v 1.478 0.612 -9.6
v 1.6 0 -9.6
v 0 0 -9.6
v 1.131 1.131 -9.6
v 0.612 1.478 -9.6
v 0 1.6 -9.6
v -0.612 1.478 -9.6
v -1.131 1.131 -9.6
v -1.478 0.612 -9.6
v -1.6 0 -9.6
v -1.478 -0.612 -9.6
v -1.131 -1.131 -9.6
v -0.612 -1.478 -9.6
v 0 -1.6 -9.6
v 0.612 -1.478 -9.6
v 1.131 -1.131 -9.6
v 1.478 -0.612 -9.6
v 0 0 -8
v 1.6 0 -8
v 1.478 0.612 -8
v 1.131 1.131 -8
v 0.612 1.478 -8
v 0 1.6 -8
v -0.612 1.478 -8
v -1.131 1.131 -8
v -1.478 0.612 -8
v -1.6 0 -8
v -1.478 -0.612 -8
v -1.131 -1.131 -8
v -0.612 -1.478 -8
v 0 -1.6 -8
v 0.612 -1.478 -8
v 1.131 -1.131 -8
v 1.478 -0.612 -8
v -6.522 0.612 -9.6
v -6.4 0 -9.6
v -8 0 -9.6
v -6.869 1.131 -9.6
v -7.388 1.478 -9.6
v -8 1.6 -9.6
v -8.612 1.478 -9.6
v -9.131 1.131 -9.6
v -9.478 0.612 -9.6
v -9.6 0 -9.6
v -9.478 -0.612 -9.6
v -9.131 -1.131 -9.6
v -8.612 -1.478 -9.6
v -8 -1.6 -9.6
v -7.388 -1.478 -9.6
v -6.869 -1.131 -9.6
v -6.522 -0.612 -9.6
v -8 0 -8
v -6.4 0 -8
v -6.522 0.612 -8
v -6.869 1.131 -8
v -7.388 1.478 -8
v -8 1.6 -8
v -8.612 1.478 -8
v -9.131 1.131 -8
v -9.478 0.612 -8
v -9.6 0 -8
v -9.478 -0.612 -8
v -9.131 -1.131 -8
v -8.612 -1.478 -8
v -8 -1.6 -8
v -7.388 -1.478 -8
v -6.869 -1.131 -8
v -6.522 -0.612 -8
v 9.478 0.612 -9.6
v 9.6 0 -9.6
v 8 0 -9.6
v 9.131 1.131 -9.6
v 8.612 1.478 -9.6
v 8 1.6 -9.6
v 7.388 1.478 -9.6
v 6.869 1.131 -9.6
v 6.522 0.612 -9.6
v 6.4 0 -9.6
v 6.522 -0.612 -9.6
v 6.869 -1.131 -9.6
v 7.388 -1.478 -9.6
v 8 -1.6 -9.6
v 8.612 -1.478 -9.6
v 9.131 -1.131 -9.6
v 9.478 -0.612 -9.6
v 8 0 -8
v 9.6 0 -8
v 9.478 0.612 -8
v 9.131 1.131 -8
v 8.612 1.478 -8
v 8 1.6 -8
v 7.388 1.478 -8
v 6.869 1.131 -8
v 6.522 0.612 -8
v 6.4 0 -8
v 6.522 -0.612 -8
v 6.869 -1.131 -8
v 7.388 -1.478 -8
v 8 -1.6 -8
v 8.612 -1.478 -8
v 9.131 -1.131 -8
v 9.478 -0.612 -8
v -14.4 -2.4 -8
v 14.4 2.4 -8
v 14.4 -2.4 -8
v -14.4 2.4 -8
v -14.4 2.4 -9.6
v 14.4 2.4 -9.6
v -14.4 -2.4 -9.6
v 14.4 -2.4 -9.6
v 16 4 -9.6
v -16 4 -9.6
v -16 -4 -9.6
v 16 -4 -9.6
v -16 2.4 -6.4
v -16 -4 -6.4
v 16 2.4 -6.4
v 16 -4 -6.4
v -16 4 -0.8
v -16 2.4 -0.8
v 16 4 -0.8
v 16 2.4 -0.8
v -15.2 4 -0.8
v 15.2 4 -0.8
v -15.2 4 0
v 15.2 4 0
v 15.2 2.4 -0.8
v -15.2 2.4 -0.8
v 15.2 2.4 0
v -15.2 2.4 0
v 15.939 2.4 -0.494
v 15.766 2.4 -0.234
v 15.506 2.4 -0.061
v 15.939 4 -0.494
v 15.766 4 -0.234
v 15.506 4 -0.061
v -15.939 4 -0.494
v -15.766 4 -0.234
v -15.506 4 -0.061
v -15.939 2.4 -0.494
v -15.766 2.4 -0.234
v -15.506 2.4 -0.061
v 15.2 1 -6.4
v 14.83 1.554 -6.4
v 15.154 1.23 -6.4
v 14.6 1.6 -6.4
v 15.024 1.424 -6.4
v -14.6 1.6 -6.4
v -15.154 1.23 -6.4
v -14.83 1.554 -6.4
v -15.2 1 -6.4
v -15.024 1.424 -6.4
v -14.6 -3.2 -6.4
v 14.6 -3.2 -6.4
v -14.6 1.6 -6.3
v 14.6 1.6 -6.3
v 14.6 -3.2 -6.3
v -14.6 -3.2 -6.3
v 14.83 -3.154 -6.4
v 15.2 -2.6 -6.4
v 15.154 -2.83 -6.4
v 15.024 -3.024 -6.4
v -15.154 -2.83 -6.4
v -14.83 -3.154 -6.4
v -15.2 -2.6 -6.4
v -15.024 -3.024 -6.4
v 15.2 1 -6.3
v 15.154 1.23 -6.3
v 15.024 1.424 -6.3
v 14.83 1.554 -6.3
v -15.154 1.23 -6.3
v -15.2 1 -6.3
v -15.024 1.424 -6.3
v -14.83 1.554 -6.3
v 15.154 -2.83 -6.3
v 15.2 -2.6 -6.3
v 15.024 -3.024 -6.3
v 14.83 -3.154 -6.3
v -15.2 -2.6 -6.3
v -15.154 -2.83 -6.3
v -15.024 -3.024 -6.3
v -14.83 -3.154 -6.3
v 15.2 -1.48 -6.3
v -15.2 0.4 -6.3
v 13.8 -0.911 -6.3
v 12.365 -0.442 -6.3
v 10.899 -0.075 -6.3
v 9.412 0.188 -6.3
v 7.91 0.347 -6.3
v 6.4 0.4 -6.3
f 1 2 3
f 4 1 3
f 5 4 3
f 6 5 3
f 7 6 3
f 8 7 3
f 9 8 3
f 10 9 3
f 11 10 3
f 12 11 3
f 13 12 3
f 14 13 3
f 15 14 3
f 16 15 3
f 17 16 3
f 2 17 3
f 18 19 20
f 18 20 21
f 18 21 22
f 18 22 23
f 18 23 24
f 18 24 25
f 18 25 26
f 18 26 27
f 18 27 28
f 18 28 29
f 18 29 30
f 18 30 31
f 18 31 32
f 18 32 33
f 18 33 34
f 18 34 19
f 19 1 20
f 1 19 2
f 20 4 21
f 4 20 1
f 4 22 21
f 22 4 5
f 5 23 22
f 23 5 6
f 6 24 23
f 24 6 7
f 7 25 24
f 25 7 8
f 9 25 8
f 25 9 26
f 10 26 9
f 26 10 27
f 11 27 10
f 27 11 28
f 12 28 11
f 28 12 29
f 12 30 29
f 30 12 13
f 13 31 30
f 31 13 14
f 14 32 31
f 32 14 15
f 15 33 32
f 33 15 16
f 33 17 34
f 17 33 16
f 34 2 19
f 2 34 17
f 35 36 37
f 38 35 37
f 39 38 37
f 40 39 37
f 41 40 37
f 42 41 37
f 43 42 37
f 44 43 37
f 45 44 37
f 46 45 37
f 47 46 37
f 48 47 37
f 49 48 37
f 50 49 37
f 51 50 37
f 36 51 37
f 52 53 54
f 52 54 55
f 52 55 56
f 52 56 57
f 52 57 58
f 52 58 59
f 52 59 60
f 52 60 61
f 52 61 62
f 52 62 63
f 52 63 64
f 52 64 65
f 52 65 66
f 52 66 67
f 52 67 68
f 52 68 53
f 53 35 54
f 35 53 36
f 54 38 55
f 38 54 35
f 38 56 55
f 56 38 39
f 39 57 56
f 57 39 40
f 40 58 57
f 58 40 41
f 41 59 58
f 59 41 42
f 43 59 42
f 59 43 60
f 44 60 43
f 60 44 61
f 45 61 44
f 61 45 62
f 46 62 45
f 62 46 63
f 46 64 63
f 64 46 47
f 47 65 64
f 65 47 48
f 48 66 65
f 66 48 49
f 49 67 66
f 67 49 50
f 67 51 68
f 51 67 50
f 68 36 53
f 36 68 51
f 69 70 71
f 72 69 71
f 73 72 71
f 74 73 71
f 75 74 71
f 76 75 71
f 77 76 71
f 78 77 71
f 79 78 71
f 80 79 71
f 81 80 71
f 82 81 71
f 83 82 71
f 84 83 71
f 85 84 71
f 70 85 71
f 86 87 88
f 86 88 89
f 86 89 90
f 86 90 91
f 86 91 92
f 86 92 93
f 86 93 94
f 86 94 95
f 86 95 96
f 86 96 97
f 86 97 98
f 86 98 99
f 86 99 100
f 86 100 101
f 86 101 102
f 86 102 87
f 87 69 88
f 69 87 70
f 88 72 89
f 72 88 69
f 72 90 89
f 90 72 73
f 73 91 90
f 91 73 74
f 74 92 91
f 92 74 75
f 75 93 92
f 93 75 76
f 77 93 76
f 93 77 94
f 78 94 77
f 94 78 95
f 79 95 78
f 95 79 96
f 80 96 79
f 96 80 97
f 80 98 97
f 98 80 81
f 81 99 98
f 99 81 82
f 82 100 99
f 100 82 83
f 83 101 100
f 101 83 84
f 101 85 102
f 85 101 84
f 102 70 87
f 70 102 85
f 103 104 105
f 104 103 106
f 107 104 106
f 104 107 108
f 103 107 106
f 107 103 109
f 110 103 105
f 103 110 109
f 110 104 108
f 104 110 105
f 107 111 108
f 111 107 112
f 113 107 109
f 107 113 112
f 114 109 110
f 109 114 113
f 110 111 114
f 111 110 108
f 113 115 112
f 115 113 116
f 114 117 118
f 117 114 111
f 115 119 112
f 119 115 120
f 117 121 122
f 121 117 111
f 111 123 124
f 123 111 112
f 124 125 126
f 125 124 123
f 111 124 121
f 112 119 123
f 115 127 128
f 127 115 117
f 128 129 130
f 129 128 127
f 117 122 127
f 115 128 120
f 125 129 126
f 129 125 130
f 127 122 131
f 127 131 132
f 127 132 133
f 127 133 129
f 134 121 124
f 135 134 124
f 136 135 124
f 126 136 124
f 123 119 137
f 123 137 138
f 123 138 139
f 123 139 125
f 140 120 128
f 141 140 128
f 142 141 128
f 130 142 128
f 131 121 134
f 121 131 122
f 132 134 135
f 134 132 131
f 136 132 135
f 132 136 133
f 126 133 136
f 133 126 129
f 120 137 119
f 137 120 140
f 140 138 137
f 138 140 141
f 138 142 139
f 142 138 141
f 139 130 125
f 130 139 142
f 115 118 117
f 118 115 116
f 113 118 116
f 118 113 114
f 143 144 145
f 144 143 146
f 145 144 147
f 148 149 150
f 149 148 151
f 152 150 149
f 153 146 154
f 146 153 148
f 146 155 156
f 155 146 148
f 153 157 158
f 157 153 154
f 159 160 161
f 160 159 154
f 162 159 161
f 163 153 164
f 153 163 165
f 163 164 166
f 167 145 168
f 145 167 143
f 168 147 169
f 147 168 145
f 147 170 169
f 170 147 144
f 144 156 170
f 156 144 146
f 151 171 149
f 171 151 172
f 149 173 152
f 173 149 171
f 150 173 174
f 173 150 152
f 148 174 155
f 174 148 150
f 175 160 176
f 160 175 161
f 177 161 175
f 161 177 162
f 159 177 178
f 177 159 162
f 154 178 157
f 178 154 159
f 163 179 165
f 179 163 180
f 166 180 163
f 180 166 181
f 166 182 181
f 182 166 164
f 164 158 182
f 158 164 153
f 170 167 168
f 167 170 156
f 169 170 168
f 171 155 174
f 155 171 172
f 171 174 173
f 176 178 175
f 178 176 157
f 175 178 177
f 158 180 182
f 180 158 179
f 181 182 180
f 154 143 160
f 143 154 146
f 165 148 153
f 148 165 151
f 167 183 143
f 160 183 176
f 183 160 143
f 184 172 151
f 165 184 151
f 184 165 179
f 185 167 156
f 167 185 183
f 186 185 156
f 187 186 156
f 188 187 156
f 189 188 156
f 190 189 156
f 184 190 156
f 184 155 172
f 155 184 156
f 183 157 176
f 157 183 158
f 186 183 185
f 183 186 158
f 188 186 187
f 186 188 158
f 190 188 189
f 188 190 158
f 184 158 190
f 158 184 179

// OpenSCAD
// file: ../p/box3u12.scad
use <../lib.scad>
function ldraw_lib__box3u12() = [
// 0 Box with 3 Parallel Faces without Any Edges
// 0 Name: box3u12.dat
// 0 Author: J.C. Tchang [tchang]
// 0 !LDRAW_ORG Primitive UPDATE 2014-02
// 0 !LICENSE Licensed under CC BY 2.0 and CC BY 4.0 : see CAreadme.txt
// 
// 0 BFC CERTIFY CCW
  [0,"BFC","CERTIFY"],
  [0,"BFC","CCW"],
// 
// 0 !HISTORY 2014-12-23 [PTadmin] Official Update 2014-02
// 
// 
// 4 16 -1 1 1 1 1 1 1 1 -1 -1 1 -1
  [4,16,-1,1,1,1,1,1,1,1,-1,-1,1,-1],
// 4 16 -1 1 1 -1 0 1 1 0 1 1 1 1
  [4,16,-1,1,1,-1,0,1,1,0,1,1,1,1],
// 4 16 1 1 -1 1 0 -1 -1 0 -1 -1 1 -1
  [4,16,1,1,-1,1,0,-1,-1,0,-1,-1,1,-1],
];
makepoly(ldraw_lib__box3u12(), line=0.2);
// file: ../p/1-4chrd.scad
use <../lib.scad>
$fa=1; $fs=0.2;
function ldraw_lib__1_4chrd(realsolid=false) = [
// 0 Chord 0.25
// 0 Name: 1-4chrd.dat
// 0 Author: Tony Hafner [hafhead]
// 0 !LDRAW_ORG Primitive UPDATE 2012-02
// 0 !LICENSE Licensed under CC BY 2.0 and CC BY 4.0 : see CAreadme.txt
// 
// 0 BFC CERTIFY CCW
  [0,"BFC","CERTIFY"],
  [0,"BFC","CCW"],
// 
// 0 !HISTORY 2004-04-22 [PTadmin] Official Update 2004-02
// 0 !HISTORY 2007-10-09 [PTadmin] Header formatted for Contributor Agreement
// 0 !HISTORY 2008-07-01 [PTadmin] Official Update 2008-01
// 0 !HISTORY 2012-08-02 [MMR1988] Re-creation with PrimGen2 and Rectifier
// 0 !HISTORY 2012-08-09 [PTadmin] Official Update 2012-02
// 
// 
// 4 16 0.9239 0 0.3827 0.3827 0 0.9239 0 0 1 1 0 0
  [4,16,0.9239,0,0.3827,0.3827,0,0.9239,0,0,1,1,0,0],
// 3 16 0.7071 0 0.7071 0.3827 0 0.9239 0.9239 0 0.3827
  [3,16,0.7071,0,0.7071,0.3827,0,0.9239,0.9239,0,0.3827],
];
module ldraw_lib__1_4chrd(step=0, col=false, unit=2/5, alt=false, line=0.2, solid=!$preview)
    makepoly(ldraw_lib__1_4chrd(solid), step=step, col=col, unit=unit, alt=alt, line=line, solid=solid);
ldraw_lib__1_4chrd(line=0.2);
// file: ../p/4-4edge.scad
use <../lib.scad>
function ldraw_lib__4_4edge() = [
// 0 Circle 1.0
// 0 Name: 4-4edge.dat
// 0 Author: James Jessiman
// 0 !LDRAW_ORG Primitive UPDATE 2017-01
// 0 !LICENSE Licensed under CC BY 2.0 and CC BY 4.0 : see CAreadme.txt
// 
// 0 BFC CERTIFY CCW
  [0,"BFC","CERTIFY"],
  [0,"BFC","CCW"],
// 
// 0 !HISTORY 1998-12-15 [PTadmin] Official Update 1998-10
// 0 !HISTORY 2005-12-28 [PTadmin] Official Update 2005-01
// 0 !HISTORY 2007-06-24 [PTadmin] Header formatted for Contributor Agreement
// 0 !HISTORY 2008-07-01 [PTadmin] Official Update 2008-01
// 0 !HISTORY 2017-01-15 [Steffen] BFCed
// 0 !HISTORY 2017-12-30 [PTadmin] Official Update 2017-01
// 
// 
// 2 24 1 0 0 0.9239 0 0.3827
  [2,24,1,0,0,0.9239,0,0.3827],
// 2 24 0.9239 0 0.3827 0.7071 0 0.7071
  [2,24,0.9239,0,0.3827,0.7071,0,0.7071],
// 2 24 0.7071 0 0.7071 0.3827 0 0.9239
  [2,24,0.7071,0,0.7071,0.3827,0,0.9239],
// 2 24 0.3827 0 0.9239 0 0 1
  [2,24,0.3827,0,0.9239,0,0,1],
// 2 24 0 0 1 -0.3827 0 0.9239
  [2,24,0,0,1,-0.3827,0,0.9239],
// 2 24 -0.3827 0 0.9239 -0.7071 0 0.7071
  [2,24,-0.3827,0,0.9239,-0.7071,0,0.7071],
// 2 24 -0.7071 0 0.7071 -0.9239 0 0.3827
  [2,24,-0.7071,0,0.7071,-0.9239,0,0.3827],
// 2 24 -0.9239 0 0.3827 -1 0 -0
  [2,24,-0.9239,0,0.3827,-1,0,-0],
// 2 24 -1 0 -0 -0.9239 0 -0.3827
  [2,24,-1,0,-0,-0.9239,0,-0.3827],
// 2 24 -0.9239 0 -0.3827 -0.7071 0 -0.7071
  [2,24,-0.9239,0,-0.3827,-0.7071,0,-0.7071],
// 2 24 -0.7071 0 -0.7071 -0.3827 0 -0.9239
  [2,24,-0.7071,0,-0.7071,-0.3827,0,-0.9239],
// 2 24 -0.3827 0 -0.9239 0 0 -1
  [2,24,-0.3827,0,-0.9239,0,0,-1],
// 2 24 0 0 -1 0.3827 0 -0.9239
  [2,24,0,0,-1,0.3827,0,-0.9239],
// 2 24 0.3827 0 -0.9239 0.7071 0 -0.7071
  [2,24,0.3827,0,-0.9239,0.7071,0,-0.7071],
// 2 24 0.7071 0 -0.7071 0.9239 0 -0.3827
  [2,24,0.7071,0,-0.7071,0.9239,0,-0.3827],
// 2 24 0.9239 0 -0.3827 1 0 0
  [2,24,0.9239,0,-0.3827,1,0,0],
];
module ldraw_lib__4_4edge(step=0, col=false, unit=2/5, alt=false, line=0.2, solid=!$preview)
    makepoly(ldraw_lib__4_4edge(), step=step, col=col, unit=unit, alt=alt, line=line, solid=solid);
ldraw_lib__4_4edge(line=0.2);
// file: ../p/4-4disc.scad
use <../lib.scad>
function ldraw_lib__4_4disc() = [
// 0 Disc 1.0
// 0 Name: 4-4disc.dat
// 0 Author: James Jessiman
// 0 !LDRAW_ORG Primitive UPDATE 2002-02
// 0 !LICENSE Licensed under CC BY 2.0 and CC BY 4.0 : see CAreadme.txt
// 
// 0 BFC CERTIFY CCW
  [0,"BFC","CERTIFY"],
  [0,"BFC","CCW"],
// 
// 0 !HISTORY 1998-12-15 [PTadmin] Official Update 1998-10
// 0 !HISTORY 2002-03-23 [sbliss] Added BFC statement
// 0 !HISTORY 2002-04-25 [PTadmin] Official Update 2002-02
// 0 !HISTORY 2007-06-24 [PTadmin] Header formatted for Contributor Agreement
// 0 !HISTORY 2008-07-01 [PTadmin] Official Update 2008-01
// 
// 
// 3 16 0 0 0 1 0 0 0.9239 0 0.3827
  [3,16,0,0,0,1,0,0,0.9239,0,0.3827],
// 3 16 0 0 0 0.9239 0 0.3827 0.7071 0 0.7071
  [3,16,0,0,0,0.9239,0,0.3827,0.7071,0,0.7071],
// 3 16 0 0 0 0.7071 0 0.7071 0.3827 0 0.9239
  [3,16,0,0,0,0.7071,0,0.7071,0.3827,0,0.9239],
// 3 16 0 0 0 0.3827 0 0.9239 0 0 1
  [3,16,0,0,0,0.3827,0,0.9239,0,0,1],
// 3 16 0 0 0 0 0 1 -0.3827 0 0.9239
  [3,16,0,0,0,0,0,1,-0.3827,0,0.9239],
// 3 16 0 0 0 -0.3827 0 0.9239 -0.7071 0 0.7071
  [3,16,0,0,0,-0.3827,0,0.9239,-0.7071,0,0.7071],
// 3 16 0 0 0 -0.7071 0 0.7071 -0.9239 0 0.3827
  [3,16,0,0,0,-0.7071,0,0.7071,-0.9239,0,0.3827],
// 3 16 0 0 0 -0.9239 0 0.3827 -1 0 -0
  [3,16,0,0,0,-0.9239,0,0.3827,-1,0,-0],
// 3 16 0 0 0 -1 0 -0 -0.9239 0 -0.3827
  [3,16,0,0,0,-1,0,-0,-0.9239,0,-0.3827],
// 3 16 0 0 0 -0.9239 0 -0.3827 -0.7071 0 -0.7071
  [3,16,0,0,0,-0.9239,0,-0.3827,-0.7071,0,-0.7071],
// 3 16 0 0 0 -0.7071 0 -0.7071 -0.3827 0 -0.9239
  [3,16,0,0,0,-0.7071,0,-0.7071,-0.3827,0,-0.9239],
// 3 16 0 0 0 -0.3827 0 -0.9239 0 0 -1
  [3,16,0,0,0,-0.3827,0,-0.9239,0,0,-1],
// 3 16 0 0 0 0 0 -1 0.3827 0 -0.9239
  [3,16,0,0,0,0,0,-1,0.3827,0,-0.9239],
// 3 16 0 0 0 0.3827 0 -0.9239 0.7071 0 -0.7071
  [3,16,0,0,0,0.3827,0,-0.9239,0.7071,0,-0.7071],
// 3 16 0 0 0 0.7071 0 -0.7071 0.9239 0 -0.3827
  [3,16,0,0,0,0.7071,0,-0.7071,0.9239,0,-0.3827],
// 3 16 0 0 0 0.9239 0 -0.3827 1 0 0
  [3,16,0,0,0,0.9239,0,-0.3827,1,0,0],
// 0
];
module ldraw_lib__4_4disc(step=0, col=false, unit=2/5, alt=false, line=0.2, solid=!$preview)
    makepoly(ldraw_lib__4_4disc(), step=step, col=col, unit=unit, alt=alt, line=line, solid=solid);
ldraw_lib__4_4disc(line=0.2);
// file: ../p/4-4cyli.scad
use <../lib.scad>
$fa=1; $fs=0.2;
function ldraw_lib__4_4cyli(realsolid=false) = [
// 0 Cylinder 1.0
// 0 Name: 4-4cyli.dat
// 0 Author: James Jessiman
// 0 !LDRAW_ORG Primitive UPDATE 2005-01
// 0 !LICENSE Licensed under CC BY 2.0 and CC BY 4.0 : see CAreadme.txt
// 
// 0 BFC CERTIFY CCW
  [0,"BFC","CERTIFY"],
  [0,"BFC","CCW"],
// 
// 0 !HISTORY 1998-12-15 [PTadmin] Official Update 1998-10
// 0 !HISTORY 2002-03-23 [sbliss] Added BFC statement; merged headers from files in distributions LDraw 0.27 and Complete.
// 0 !HISTORY 2002-04-25 [PTadmin] Official Update 2002-02
// 0 !HISTORY 2004-12-14 [guyvivan] BFC CCW
// 0 !HISTORY 2005-12-28 [PTadmin] Official Update 2005-01
// 0 !HISTORY 2007-06-24 [PTadmin] Header formatted for Contributor Agreement
// 0 !HISTORY 2008-07-01 [PTadmin] Official Update 2008-01
// 
// 
// 4 16 1 1 0 0.9239 1 0.3827 0.9239 0 0.3827 1 0 0
  [4,16,1,1,0,0.9239,1,0.3827,0.9239,0,0.3827,1,0,0],
// 5 24 1 0 0 1 1 0 0.9239 0 0.3827 0.9239 0 -0.3827
  [5,24,1,0,0,1,1,0,0.9239,0,0.3827,0.9239,0,-0.3827],
// 4 16 0.9239 1 0.3827 0.7071 1 0.7071 0.7071 0 0.7071 0.9239 0 0.3827
  [4,16,0.9239,1,0.3827,0.7071,1,0.7071,0.7071,0,0.7071,0.9239,0,0.3827],
// 5 24 0.9239 0 0.3827 0.9239 1 0.3827 0.7071 0 0.7071 1 0 0
  [5,24,0.9239,0,0.3827,0.9239,1,0.3827,0.7071,0,0.7071,1,0,0],
// 4 16 0.7071 1 0.7071 0.3827 1 0.9239 0.3827 0 0.9239 0.7071 0 0.7071
  [4,16,0.7071,1,0.7071,0.3827,1,0.9239,0.3827,0,0.9239,0.7071,0,0.7071],
// 5 24 0.7071 0 0.7071 0.7071 1 0.7071 0.3827 0 0.9239 0.9239 0 0.3827
  [5,24,0.7071,0,0.7071,0.7071,1,0.7071,0.3827,0,0.9239,0.9239,0,0.3827],
// 4 16 0.3827 1 0.9239 0 1 1 0 0 1 0.3827 0 0.9239
  [4,16,0.3827,1,0.9239,0,1,1,0,0,1,0.3827,0,0.9239],
// 5 24 0.3827 0 0.9239 0.3827 1 0.9239 0 0 1 0.7071 0 0.7071
  [5,24,0.3827,0,0.9239,0.3827,1,0.9239,0,0,1,0.7071,0,0.7071],
// 4 16 0 1 1 -0.3827 1 0.9239 -0.3827 0 0.9239 0 0 1
  [4,16,0,1,1,-0.3827,1,0.9239,-0.3827,0,0.9239,0,0,1],
// 5 24 0 0 1 0 1 1 -0.3827 0 0.9239 0.3827 0 0.9239
  [5,24,0,0,1,0,1,1,-0.3827,0,0.9239,0.3827,0,0.9239],
// 4 16 -0.3827 1 0.9239 -0.7071 1 0.7071 -0.7071 0 0.7071 -0.3827 0 0.9239
  [4,16,-0.3827,1,0.9239,-0.7071,1,0.7071,-0.7071,0,0.7071,-0.3827,0,0.9239],
// 5 24 -0.3827 0 0.9239 -0.3827 1 0.9239 -0.7071 0 0.7071 0 0 1
  [5,24,-0.3827,0,0.9239,-0.3827,1,0.9239,-0.7071,0,0.7071,0,0,1],
// 4 16 -0.7071 1 0.7071 -0.9239 1 0.3827 -0.9239 0 0.3827 -0.7071 0 0.7071
  [4,16,-0.7071,1,0.7071,-0.9239,1,0.3827,-0.9239,0,0.3827,-0.7071,0,0.7071],
// 5 24 -0.7071 0 0.7071 -0.7071 1 0.7071 -0.9239 0 0.3827 -0.3827 0 0.9239
  [5,24,-0.7071,0,0.7071,-0.7071,1,0.7071,-0.9239,0,0.3827,-0.3827,0,0.9239],
// 4 16 -0.9239 1 0.3827 -1 1 0 -1 0 0 -0.9239 0 0.3827
  [4,16,-0.9239,1,0.3827,-1,1,0,-1,0,0,-0.9239,0,0.3827],
// 5 24 -0.9239 0 0.3827 -0.9239 1 0.3827 -1 0 0 -0.7071 0 0.7071
  [5,24,-0.9239,0,0.3827,-0.9239,1,0.3827,-1,0,0,-0.7071,0,0.7071],
// 4 16 -1 1 0 -0.9239 1 -0.3827 -0.9239 0 -0.3827 -1 0 0
  [4,16,-1,1,0,-0.9239,1,-0.3827,-0.9239,0,-0.3827,-1,0,0],
// 5 24 -1 0 0 -1 1 0 -0.9239 0 -0.3827 -0.9239 0 0.3827
  [5,24,-1,0,0,-1,1,0,-0.9239,0,-0.3827,-0.9239,0,0.3827],
// 4 16 -0.9239 1 -0.3827 -0.7071 1 -0.7071 -0.7071 0 -0.7071 -0.9239 0 -0.3827
  [4,16,-0.9239,1,-0.3827,-0.7071,1,-0.7071,-0.7071,0,-0.7071,-0.9239,0,-0.3827],
// 5 24 -0.9239 0 -0.3827 -0.9239 1 -0.3827 -0.7071 0 -0.7071 -1 0 0
  [5,24,-0.9239,0,-0.3827,-0.9239,1,-0.3827,-0.7071,0,-0.7071,-1,0,0],
// 4 16 -0.7071 1 -0.7071 -0.3827 1 -0.9239 -0.3827 0 -0.9239 -0.7071 0 -0.7071
  [4,16,-0.7071,1,-0.7071,-0.3827,1,-0.9239,-0.3827,0,-0.9239,-0.7071,0,-0.7071],
// 5 24 -0.7071 0 -0.7071 -0.7071 1 -0.7071 -0.3827 0 -0.9239 -0.9239 0 -0.3827
  [5,24,-0.7071,0,-0.7071,-0.7071,1,-0.7071,-0.3827,0,-0.9239,-0.9239,0,-0.3827],
// 4 16 -0.3827 1 -0.9239 0 1 -1 0 0 -1 -0.3827 0 -0.9239
  [4,16,-0.3827,1,-0.9239,0,1,-1,0,0,-1,-0.3827,0,-0.9239],
// 5 24 -0.3827 0 -0.9239 -0.3827 1 -0.9239 0 0 -1 -0.7071 0 -0.7071
  [5,24,-0.3827,0,-0.9239,-0.3827,1,-0.9239,0,0,-1,-0.7071,0,-0.7071],
// 4 16 0 1 -1 0.3827 1 -0.9239 0.3827 0 -0.9239 0 0 -1
  [4,16,0,1,-1,0.3827,1,-0.9239,0.3827,0,-0.9239,0,0,-1],
// 5 24 0 0 -1 0 1 -1 0.3827 0 -0.9239 -0.3827 0 -0.9239
  [5,24,0,0,-1,0,1,-1,0.3827,0,-0.9239,-0.3827,0,-0.9239],
// 4 16 0.3827 1 -0.9239 0.7071 1 -0.7071 0.7071 0 -0.7071 0.3827 0 -0.9239
  [4,16,0.3827,1,-0.9239,0.7071,1,-0.7071,0.7071,0,-0.7071,0.3827,0,-0.9239],
// 5 24 0.3827 0 -0.9239 0.3827 1 -0.9239 0.7071 0 -0.7071 0 0 -1
  [5,24,0.3827,0,-0.9239,0.3827,1,-0.9239,0.7071,0,-0.7071,0,0,-1],
// 4 16 0.7071 1 -0.7071 0.9239 1 -0.3827 0.9239 0 -0.3827 0.7071 0 -0.7071
  [4,16,0.7071,1,-0.7071,0.9239,1,-0.3827,0.9239,0,-0.3827,0.7071,0,-0.7071],
// 5 24 0.7071 0 -0.7071 0.7071 1 -0.7071 0.9239 0 -0.3827 0.3827 0 -0.9239
  [5,24,0.7071,0,-0.7071,0.7071,1,-0.7071,0.9239,0,-0.3827,0.3827,0,-0.9239],
// 4 16 0.9239 1 -0.3827 1 1 0 1 0 0 0.9239 0 -0.3827
  [4,16,0.9239,1,-0.3827,1,1,0,1,0,0,0.9239,0,-0.3827],
// 5 24 0.9239 0 -0.3827 0.9239 1 -0.3827 1 0 0 0.7071 0 -0.7071
  [5,24,0.9239,0,-0.3827,0.9239,1,-0.3827,1,0,0,0.7071,0,-0.7071],
// 0
];
module ldraw_lib__4_4cyli(step=0, col=false, unit=2/5, alt=false, line=0.2, solid=!$preview)
    makepoly(ldraw_lib__4_4cyli(solid), step=step, col=col, unit=unit, alt=alt, line=line, solid=solid);
ldraw_lib__4_4cyli(line=0.2);
// file: ../p/1-4edge.scad
use <../lib.scad>
$fa=1; $fs=0.2;
function ldraw_lib__1_4edge(realsolid=false) = [
// 0 Circle 0.25
// 0 Name: 1-4edge.dat
// 0 Author: James Jessiman
// 0 !LDRAW_ORG Primitive UPDATE 2017-01
// 0 !LICENSE Licensed under CC BY 2.0 and CC BY 4.0 : see CAreadme.txt
// 
// 0 BFC CERTIFY CCW
  [0,"BFC","CERTIFY"],
  [0,"BFC","CCW"],
// 
// 0 !HISTORY 2007-06-22 [PTadmin] Header formatted for Contributor Agreement
// 0 !HISTORY 2008-07-01 [PTadmin] Official Update 2008-01
// 0 !HISTORY 2017-01-15 [Steffen] BFCed
// 0 !HISTORY 2017-12-30 [PTadmin] Official Update 2017-01
// 
// 
// 2 24 1 0 0 0.9239 0 0.3827
  [2,24,1,0,0,0.9239,0,0.3827],
// 2 24 0.9239 0 0.3827 0.7071 0 0.7071
  [2,24,0.9239,0,0.3827,0.7071,0,0.7071],
// 2 24 0.7071 0 0.7071 0.3827 0 0.9239
  [2,24,0.7071,0,0.7071,0.3827,0,0.9239],
// 2 24 0.3827 0 0.9239 0 0 1
  [2,24,0.3827,0,0.9239,0,0,1],
];
module ldraw_lib__1_4edge(step=0, col=false, unit=2/5, alt=false, line=0.2, solid=!$preview)
    makepoly(ldraw_lib__1_4edge(solid), step=step, col=col, unit=unit, alt=alt, line=line, solid=solid);
ldraw_lib__1_4edge(line=0.2);
// file: ../p/1-4cyli.scad
use <../lib.scad>
function ldraw_lib__1_4cyli() = [
// 0 Cylinder 0.25
// 0 Name: 1-4cyli.dat
// 0 Author: James Jessiman
// 0 !LDRAW_ORG Primitive UPDATE 2012-01
// 0 !LICENSE Licensed under CC BY 2.0 and CC BY 4.0 : see CAreadme.txt
// 
// 0 BFC CERTIFY CCW
  [0,"BFC","CERTIFY"],
  [0,"BFC","CCW"],
// 
// 0 !HISTORY 2002-03-23 [sbliss] Added BFC statement.
// 0 !HISTORY 2002-04-25 [PTadmin] Official Update 2002-02
// 0 !HISTORY 2007-06-22 [PTadmin] Header formatted for Contributor Agreement
// 0 !HISTORY 2008-07-01 [PTadmin] Official Update 2008-01
// 0 !HISTORY 2012-02-16 [Philo] Changed to CCW
// 0 !HISTORY 2012-03-30 [PTadmin] Official Update 2012-01
// 
// 
// 4 16 1 1 0 0.9239 1 0.3827 0.9239 0 0.3827 1 0 0
  [4,16,1,1,0,0.9239,1,0.3827,0.9239,0,0.3827,1,0,0],
// 5 24 1 0 0 1 1 0 0.9239 0 0.3827 1 0 -1
  [5,24,1,0,0,1,1,0,0.9239,0,0.3827,1,0,-1],
// 4 16 0.9239 1 0.3827 0.7071 1 0.7071 0.7071 0 0.7071 0.9239 0 0.3827
  [4,16,0.9239,1,0.3827,0.7071,1,0.7071,0.7071,0,0.7071,0.9239,0,0.3827],
// 5 24 0.9239 0 0.3827 0.9239 1 0.3827 0.7071 0 0.7071 1 0 0
  [5,24,0.9239,0,0.3827,0.9239,1,0.3827,0.7071,0,0.7071,1,0,0],
// 4 16 0.7071 1 0.7071 0.3827 1 0.9239 0.3827 0 0.9239 0.7071 0 0.7071
  [4,16,0.7071,1,0.7071,0.3827,1,0.9239,0.3827,0,0.9239,0.7071,0,0.7071],
// 5 24 0.7071 0 0.7071 0.7071 1 0.7071 0.3827 0 0.9239 0.9239 0 0.3827
  [5,24,0.7071,0,0.7071,0.7071,1,0.7071,0.3827,0,0.9239,0.9239,0,0.3827],
// 4 16 0.3827 1 0.9239 0 1 1 0 0 1 0.3827 0 0.9239
  [4,16,0.3827,1,0.9239,0,1,1,0,0,1,0.3827,0,0.9239],
// 5 24 0.3827 0 0.9239 0.3827 1 0.9239 0 0 1 0.7071 0 0.7071
  [5,24,0.3827,0,0.9239,0.3827,1,0.9239,0,0,1,0.7071,0,0.7071],
// 5 24 0 0 1 0 1 1 0.3827 0 0.9239 -1 0 1
  [5,24,0,0,1,0,1,1,0.3827,0,0.9239,-1,0,1],
];
module ldraw_lib__1_4cyli(step=0, col=false, unit=2/5, alt=false, line=0.2, solid=!$preview)
    makepoly(ldraw_lib__1_4cyli(), step=step, col=col, unit=unit, alt=alt, line=line, solid=solid);
ldraw_lib__1_4cyli(line=0.2);
// file: 6221655r.scad
use <../lib.scad>
use <../p/1-4chrd.scad>
use <../p/1-4cyli.scad>
use <../p/box3u12.scad>
function ldraw_lib__6221655r() = [
// 0 Sticker  0.6 x  3.8 with Red Stripe on Black Background Right
// 0 Name: 6221655r.dat
// 0 Author: Massimo Maso [Sirio]
// 0 !LDRAW_ORG Part UPDATE 2024-09
// 0 !LICENSE Licensed under CC BY 4.0 : see CAreadme.txt
// 
// 0 BFC CERTIFY CCW
  [0,"BFC","CERTIFY"],
  [0,"BFC","CCW"],
// 
// 0 !KEYWORDS 3.0, 911 RSR, Porsche, Set 75888, Speed Champions, Turbo
// 
// 0 !HISTORY 2024-10-27 [OrionP] Official Update 2024-09
// 
// 0 // Primitives
// 1 16 -36.5 0 4.5 -1.5 0 0 0 -1 0 0 0 1.5 1-4chrd.dat
  [1,16,-36.5,0,4.5,-1.5,0,0,0,-1,0,0,0,1.5, ldraw_lib__1_4chrd()],
// 1 16 36.5 0 4.5 1.5 0 0 0 -1 0 0 0 1.5 1-4chrd.dat
  [1,16,36.5,0,4.5,1.5,0,0,0,-1,0,0,0,1.5, ldraw_lib__1_4chrd()],
// 1 16 0 -.25 0 36.5 0 0 0 .25 0 0 0 6 box3u12.dat
  [1,16,0,-.25,0,36.5,0,0,0,.25,0,0,0,6, ldraw_lib__box3u12()],
// 1 16 -36.5 0 -4.5 -1.5 0 0 0 -1 0 0 0 -1.5 1-4chrd.dat
  [1,16,-36.5,0,-4.5,-1.5,0,0,0,-1,0,0,0,-1.5, ldraw_lib__1_4chrd()],
// 1 16 36.5 0 -4.5 1.5 0 0 0 -1 0 0 0 -1.5 1-4chrd.dat
  [1,16,36.5,0,-4.5,1.5,0,0,0,-1,0,0,0,-1.5, ldraw_lib__1_4chrd()],
// 1 16 -36.5 -.25 4.5 -1.5 0 0 0 .25 0 0 0 1.5 1-4cyli.dat
  [1,16,-36.5,-.25,4.5,-1.5,0,0,0,.25,0,0,0,1.5, ldraw_lib__1_4cyli()],
// 1 16 36.5 -.25 4.5 1.5 0 0 0 .25 0 0 0 1.5 1-4cyli.dat
  [1,16,36.5,-.25,4.5,1.5,0,0,0,.25,0,0,0,1.5, ldraw_lib__1_4cyli()],
// 1 16 -36.5 -.25 -4.5 -1.5 0 0 0 .25 0 0 0 -1.5 1-4cyli.dat
  [1,16,-36.5,-.25,-4.5,-1.5,0,0,0,.25,0,0,0,-1.5, ldraw_lib__1_4cyli()],
// 1 16 36.5 -.25 -4.5 1.5 0 0 0 .25 0 0 0 -1.5 1-4cyli.dat
  [1,16,36.5,-.25,-4.5,1.5,0,0,0,.25,0,0,0,-1.5, ldraw_lib__1_4cyli()],
// 1 0 -36.5 -.25 4.5 -1.5 0 0 0 1 0 0 0 1.5 1-4chrd.dat
  [1,0,-36.5,-.25,4.5,-1.5,0,0,0,1,0,0,0,1.5, ldraw_lib__1_4chrd()],
// 1 0 36.5 -.25 4.5 1.5 0 0 0 1 0 0 0 1.5 1-4chrd.dat
  [1,0,36.5,-.25,4.5,1.5,0,0,0,1,0,0,0,1.5, ldraw_lib__1_4chrd()],
// 1 4 -36.5 -.25 -4.5 -1.5 0 0 0 1 0 0 0 -1.5 1-4chrd.dat
  [1,4,-36.5,-.25,-4.5,-1.5,0,0,0,1,0,0,0,-1.5, ldraw_lib__1_4chrd()],
// 1 4 36.5 -.25 -4.5 1.5 0 0 0 1 0 0 0 -1.5 1-4chrd.dat
  [1,4,36.5,-.25,-4.5,1.5,0,0,0,1,0,0,0,-1.5, ldraw_lib__1_4chrd()],
// 0 // Bottom face
// 4 16 -36.5 0 6 -36.5 0 -6 -38 0 -4.5 -38 0 4.5
  [4,16,-36.5,0,6,-36.5,0,-6,-38,0,-4.5,-38,0,4.5],
// 4 16 36.5 0 6 38 0 4.5 38 0 -4.5 36.5 0 -6
  [4,16,36.5,0,6,38,0,4.5,38,0,-4.5,36.5,0,-6],
// 0 // Lateral face
// 3 16 -38 0 4.5 -38 -.25 -1.7 -38 -.25 4.5
  [3,16,-38,0,4.5,-38,-.25,-1.7,-38,-.25,4.5],
// 4 16 -38 0 4.5 -38 0 -4.5 -38 -.25 -4.5 -38 -.25 -1.7
  [4,16,-38,0,4.5,-38,0,-4.5,-38,-.25,-4.5,-38,-.25,-1.7],
// 3 16 38 0 4.5 38 -.25 4.5 38 -.25 3
  [3,16,38,0,4.5,38,-.25,4.5,38,-.25,3],
// 4 16 38 0 4.5 38 -.25 3 38 -.25 -4.5 38 0 -4.5
  [4,16,38,0,4.5,38,-.25,3,38,-.25,-4.5,38,0,-4.5],
// 0 // Top face
// 0 // Black faces
// 4 0 -36.5 -.25 6 -38 -.25 4.5 -38 -.25 -1.7 -34.5012 -.25 -.2787
  [4,0,-36.5,-.25,6,-38,-.25,4.5,-38,-.25,-1.7,-34.5012,-.25,-.2787],
// 3 0 -36.5 -.25 6 -34.5012 -.25 -.2787 -30.9114 -.25 .8939
  [3,0,-36.5,-.25,6,-34.5012,-.25,-.2787,-30.9114,-.25,.8939],
// 3 0 -36.5 -.25 6 -30.9114 -.25 .8939 -27.2482 -.25 1.8119
  [3,0,-36.5,-.25,6,-30.9114,-.25,.8939,-27.2482,-.25,1.8119],
// 3 0 -36.5 -.25 6 -27.2482 -.25 1.8119 -23.5297 -.25 2.4709
  [3,0,-36.5,-.25,6,-27.2482,-.25,1.8119,-23.5297,-.25,2.4709],
// 3 0 -36.5 -.25 6 -23.5297 -.25 2.4709 -19.7741 -.25 2.8676
  [3,0,-36.5,-.25,6,-23.5297,-.25,2.4709,-19.7741,-.25,2.8676],
// 3 0 -36.5 -.25 6 -19.7741 -.25 2.8676 -16 -.25 3
  [3,0,-36.5,-.25,6,-19.7741,-.25,2.8676,-16,-.25,3],
// 3 0 -36.5 -.25 6 -16 -.25 3 38 -.25 3
  [3,0,-36.5,-.25,6,-16,-.25,3,38,-.25,3],
// 4 0 -36.5 -.25 6 38 -.25 3 38 -.25 4.5 36.5 -.25 6
  [4,0,-36.5,-.25,6,38,-.25,3,38,-.25,4.5,36.5,-.25,6],
// 0 // Red faces
// 4 4 36.5 -.25 -6 -38 -.25 -1.7 -38 -.25 -4.5 -36.5 -.25 -6
  [4,4,36.5,-.25,-6,-38,-.25,-1.7,-38,-.25,-4.5,-36.5,-.25,-6],
// 4 4 36.5 -.25 -6 -30.9114 -.25 .8939 -34.5012 -.25 -.2787 -38 -.25 -1.7
  [4,4,36.5,-.25,-6,-30.9114,-.25,.8939,-34.5012,-.25,-.2787,-38,-.25,-1.7],
// 4 4 36.5 -.25 -6 -23.5297 -.25 2.4709 -27.2482 -.25 1.8119 -30.9114 -.25 .8939
  [4,4,36.5,-.25,-6,-23.5297,-.25,2.4709,-27.2482,-.25,1.8119,-30.9114,-.25,.8939],
// 4 4 36.5 -.25 -6 -16 -.25 3 -19.7741 -.25 2.8676 -23.5297 -.25 2.4709
  [4,4,36.5,-.25,-6,-16,-.25,3,-19.7741,-.25,2.8676,-23.5297,-.25,2.4709],
// 4 4 36.5 -.25 -6 38 -.25 -4.5 38 -.25 3 -16 -.25 3
  [4,4,36.5,-.25,-6,38,-.25,-4.5,38,-.25,3,-16,-.25,3],
];
module ldraw_lib__6221655r(step=0, col=false, unit=2/5, alt=false, line=0.2, solid=!$preview)
    makepoly(ldraw_lib__6221655r(), step=step, col=col, unit=unit, alt=alt, line=line, solid=solid);
ldraw_lib__6221655r(line=0.2);
// file: ../p/stud3.scad
use <../lib.scad>
use <4-4cyli.scad>
use <4-4disc.scad>
use <4-4edge.scad>
function ldraw_lib__stud3() = [
// 0 Stud Tube Solid
// 0 Name: stud3.dat
// 0 Author: James Jessiman
// 0 !LDRAW_ORG Primitive UPDATE 2012-01
// 0 !LICENSE Licensed under CC BY 4.0 : see CAreadme.txt
// 
// 0 BFC CERTIFY CCW
  [0,"BFC","CERTIFY"],
  [0,"BFC","CCW"],
// 
// 0 !HISTORY 2002-04-04 [sbliss] Modified for BFC compliance
// 0 !HISTORY 2002-04-25 [PTadmin] Official Update 2002-02
// 0 !HISTORY 2007-06-24 [PTadmin] Header formatted for Contributor Agreement
// 0 !HISTORY 2008-07-01 [PTadmin] Official Update 2008-01
// 0 !HISTORY 2012-02-16 [Philo] Changed to CCW
// 0 !HISTORY 2012-03-30 [PTadmin] Official Update 2012-01
// 
// 
// 1 16 0 -4 0 4 0 0 0 1 0 0 0 4 4-4edge.dat
  [1,16,0,-4,0,4,0,0,0,1,0,0,0,4, ldraw_lib__4_4edge()],
// 1 16 0 0 0 4 0 0 0 1 0 0 0 4 4-4edge.dat
  [1,16,0,0,0,4,0,0,0,1,0,0,0,4, ldraw_lib__4_4edge()],
// 1 16 0 -4 0 4 0 0 0 1 0 0 0 4 4-4disc.dat
  [1,16,0,-4,0,4,0,0,0,1,0,0,0,4, ldraw_lib__4_4disc()],
  [-1,16,0,0,0,4,0,0,0,-1,0,0,0,4, ldraw_lib__4_4disc()],
// 1 16 0 -4 0 4 0 0 0 4 0 0 0 4 4-4cyli.dat
  [1,16,0,-4,0,4,0,0,0,4,0,0,0,4, ldraw_lib__4_4cyli()],
];
module ldraw_lib__stud3(step=0, col=false, unit=2/5, alt=false, line=0.2, solid=!$preview)
    makepoly(ldraw_lib__stud3(), step=step, col=col, unit=unit, alt=alt, line=line, solid=solid);
ldraw_lib__stud3(line=0.2);
// file: ../p/box5.scad
use <../lib.scad>
function ldraw_lib__box5() = [
// 0 Box with 5 Faces and All Edges
// 0 Name: box5.dat
// 0 Author: James Jessiman
// 0 !LDRAW_ORG Primitive UPDATE 2012-01
// 0 !LICENSE Licensed under CC BY 2.0 and CC BY 4.0 : see CAreadme.txt
// 
// 0 BFC CERTIFY CCW
  [0,"BFC","CERTIFY"],
  [0,"BFC","CCW"],
// 
// 0 !HISTORY 2002-04-03 [sbliss] Modified for BFC compliance
// 0 !HISTORY 2002-04-25 [PTadmin] Official Update 2002-02
// 0 !HISTORY 2007-06-24 [PTadmin] Header formatted for Contributor Agreement
// 0 !HISTORY 2008-07-01 [PTadmin] Official Update 2008-01
// 0 !HISTORY 2012-02-16 [Philo] Changed to CCW
// 0 !HISTORY 2012-03-30 [PTadmin] Official Update 2012-01
// 
// 
// 2 24 1 1 1 -1 1 1
  [2,24,1,1,1,-1,1,1],
// 2 24 -1 1 1 -1 1 -1
  [2,24,-1,1,1,-1,1,-1],
// 2 24 -1 1 -1 1 1 -1
  [2,24,-1,1,-1,1,1,-1],
// 2 24 1 1 -1 1 1 1
  [2,24,1,1,-1,1,1,1],
// 2 24 1 0 1 -1 0 1
  [2,24,1,0,1,-1,0,1],
// 2 24 -1 0 1 -1 0 -1
  [2,24,-1,0,1,-1,0,-1],
// 2 24 -1 0 -1 1 0 -1
  [2,24,-1,0,-1,1,0,-1],
// 2 24 1 0 -1 1 0 1
  [2,24,1,0,-1,1,0,1],
// 2 24 1 0 1 1 1 1
  [2,24,1,0,1,1,1,1],
// 2 24 -1 0 1 -1 1 1
  [2,24,-1,0,1,-1,1,1],
// 2 24 1 0 -1 1 1 -1
  [2,24,1,0,-1,1,1,-1],
// 2 24 -1 0 -1 -1 1 -1
  [2,24,-1,0,-1,-1,1,-1],
// 4 16 -1 1 1 1 1 1 1 1 -1 -1 1 -1
  [4,16,-1,1,1,1,1,1,1,1,-1,-1,1,-1],
// 4 16 -1 1 1 -1 0 1 1 0 1 1 1 1
  [4,16,-1,1,1,-1,0,1,1,0,1,1,1,1],
// 4 16 -1 1 -1 -1 0 -1 -1 0 1 -1 1 1
  [4,16,-1,1,-1,-1,0,-1,-1,0,1,-1,1,1],
// 4 16 1 1 -1 1 0 -1 -1 0 -1 -1 1 -1
  [4,16,1,1,-1,1,0,-1,-1,0,-1,-1,1,-1],
// 4 16 1 1 1 1 0 1 1 0 -1 1 1 -1
  [4,16,1,1,1,1,0,1,1,0,-1,1,1,-1],
];
makepoly(ldraw_lib__box5(), line=0.2);
// file: ../p/box2-5.scad
use <../lib.scad>
$fa=1; $fs=0.2;
function ldraw_lib__box2_5(realsolid=false) = [
// 0 Box with 2 Faces without 5 Edges
// 0 Name: box2-5.dat
// 0 Author: Steffen [Steffen]
// 0 !LDRAW_ORG Primitive UPDATE 2003-03
// 0 !LICENSE Licensed under CC BY 2.0 and CC BY 4.0 : see CAreadme.txt
// 
// 0 BFC CERTIFY CCW
  [0,"BFC","CERTIFY"],
  [0,"BFC","CCW"],
// 
// 0 !HISTORY 2003-12-19 [PTadmin] Official Update 2003-03
// 0 !HISTORY 2007-06-24 [PTadmin] Header formatted for Contributor Agreement
// 0 !HISTORY 2008-07-01 [PTadmin] Official Update 2008-01
// 
// 
// 2 24 1 1 1 -1 1 1
  [2,24,1,1,1,-1,1,1],
// 2 24 1 1 -1 -1 1 -1
  [2,24,1,1,-1,-1,1,-1],
// 2 24 1 -1 1 -1 -1 1
  [2,24,1,-1,1,-1,-1,1],
// 2 24 -1 -1 1 -1 1 1
  [2,24,-1,-1,1,-1,1,1],
// 2 24 1 -1 1 1 1 1
  [2,24,1,-1,1,1,1,1],
// 2 24 -1 1 -1 -1 1 1
  [2,24,-1,1,-1,-1,1,1],
// 2 24 1 1 -1 1 1 1
  [2,24,1,1,-1,1,1,1],
// 4 16 1 1 1 1 1 -1 -1 1 -1 -1 1 1
  [4,16,1,1,1,1,1,-1,-1,1,-1,-1,1,1],
// 4 16 1 1 1 -1 1 1 -1 -1 1 1 -1 1
  [4,16,1,1,1,-1,1,1,-1,-1,1,1,-1,1],
// 0
];
module ldraw_lib__box2_5(step=0, col=false, unit=2/5, alt=false, line=0.2, solid=!$preview)
    makepoly(ldraw_lib__box2_5(solid), step=step, col=col, unit=unit, alt=alt, line=line, solid=solid);
ldraw_lib__box2_5(line=0.2);
// file: ../p/1-4disc.scad
use <../lib.scad>
function ldraw_lib__1_4disc() = [
// 0 Disc 0.25
// 0 Name: 1-4disc.dat
// 0 Author: James Jessiman
// 0 !LDRAW_ORG Primitive UPDATE 2002-02
// 0 !LICENSE Licensed under CC BY 2.0 and CC BY 4.0 : see CAreadme.txt
// 
// 0 BFC CERTIFY CCW
  [0,"BFC","CERTIFY"],
  [0,"BFC","CCW"],
// 
// 0 !HISTORY 2002-03-23 [sbliss] Added BFC statement.
// 0 !HISTORY 2002-04-25 [PTadmin] Official Update 2002-02
// 0 !HISTORY 2007-06-22 [PTadmin] Header formatted for Contributor Agreement
// 0 !HISTORY 2008-07-01 [PTadmin] Official Update 2008-01
// 
// 
// 3 16 0 0 0 1 0 0 0.9239 0 0.3827
  [3,16,0,0,0,1,0,0,0.9239,0,0.3827],
// 3 16 0 0 0 0.9239 0 0.3827 0.7071 0 0.7071
  [3,16,0,0,0,0.9239,0,0.3827,0.7071,0,0.7071],
// 3 16 0 0 0 0.7071 0 0.7071 0.3827 0 0.9239
  [3,16,0,0,0,0.7071,0,0.7071,0.3827,0,0.9239],
// 3 16 0 0 0 0.3827 0 0.9239 0 0 1
  [3,16,0,0,0,0.3827,0,0.9239,0,0,1],
// 0
];
makepoly(ldraw_lib__1_4disc(), line=0.2);
// file: ../p/1-4cylo.scad
use <../lib.scad>
use <1-4cyli.scad>
use <1-4edge.scad>
$fa=1; $fs=0.2;
function ldraw_lib__1_4cylo(realsolid=false) = [
// 0 Cylinder Open 0.25
// 0 Name: 1-4cylo.dat
// 0 Author: Max Martin Richter [MMR1988]
// 0 !LDRAW_ORG Primitive UPDATE 2010-03
// 0 !LICENSE Licensed under CC BY 2.0 and CC BY 4.0 : see CAreadme.txt
// 
// 0 BFC CERTIFY CCW
  [0,"BFC","CERTIFY"],
  [0,"BFC","CCW"],
// 
// 0 !HISTORY 2010-12-31 [PTadmin] Official Update 2010-03
// 
// 
// 1 16 0 0 0 1 0 0 0 1 0 0 0 1 1-4edge.dat
  [1,16,0,0,0,1,0,0,0,1,0,0,0,1, ldraw_lib__1_4edge(realsolid)],
// 1 16 0 1 0 1 0 0 0 1 0 0 0 1 1-4edge.dat
  [1,16,0,1,0,1,0,0,0,1,0,0,0,1, ldraw_lib__1_4edge(realsolid)],
// 1 16 0 0 0 1 0 0 0 1 0 0 0 1 1-4cyli.dat
  [1,16,0,0,0,1,0,0,0,1,0,0,0,1, ldraw_lib__1_4cyli(realsolid)],
];
module ldraw_lib__1_4cylo(step=0, col=false, unit=2/5, alt=false, line=0.2, solid=!$preview)
    makepoly(ldraw_lib__1_4cylo(solid), step=step, col=col, unit=unit, alt=alt, line=line, solid=solid);
ldraw_lib__1_4cylo(line=0.2);
// file: 6221655w.scad
use <../lib.scad>
use <6221655r.scad>
function ldraw_lib__6221655w() = [
// 0 Sticker  0.6 x  3.8 with Red Stripe on Black Background Left
// 0 Name: 6221655w.dat
// 0 Author: Massimo Maso [Sirio]
// 0 !LDRAW_ORG Part UPDATE 2024-09
// 0 !LICENSE Licensed under CC BY 4.0 : see CAreadme.txt
// 
// 0 BFC CERTIFY CCW
  [0,"BFC","CERTIFY"],
  [0,"BFC","CCW"],
// 
// 0 !KEYWORDS 3.0, 911 RSR, Porsche, Set 75888, Speed Champions, Turbo
// 
// 0 !HISTORY 2024-10-27 [OrionP] Official Update 2024-09
// 
// 1 16 0 0 0 -1 0 0 0 1 0 0 0 1 6221655r.dat
  [1,16,0,0,0,-1,0,0,0,1,0,0,0,1, ldraw_lib__6221655r()],
];
module ldraw_lib__6221655w(step=0, col=false, unit=2/5, alt=false, line=0.2, solid=!$preview)
    makepoly(ldraw_lib__6221655w(), step=step, col=col, unit=unit, alt=alt, line=line, solid=solid);
ldraw_lib__6221655w(line=0.2);
// file: 30413.scad
use <../lib.scad>
use <../p/1-4cylo.scad>
use <../p/1-4disc.scad>
use <../p/box2-5.scad>
use <../p/box5.scad>
use <../p/stud3.scad>
$fa=1; $fs=0.2;
function ldraw_lib__30413(realsolid=false) = [
// 0 Panel  1 x  4 x  1 with Rounded Corners, Thick Wall
// 0 Name: 30413.dat
// 0 Author: R. M. Rodinsky [dublar]
// 0 !LDRAW_ORG Part UPDATE 2019-02
// 0 !LICENSE Licensed under CC BY 2.0 and CC BY 4.0 : see CAreadme.txt
// 
// 0 BFC CERTIFY CCW
  [0,"BFC","CERTIFY"],
  [0,"BFC","CCW"],
// 
// 0 !HISTORY 2002-04-25 [PTadmin] Official Update 2002-02
// 0 !HISTORY 2007-06-09 [PTadmin] Header formatted for Contributor Agreement
// 0 !HISTORY 2008-07-01 [PTadmin] Official Update 2008-01
// 0 !HISTORY 2008-07-07 [mikeheide] BFC'd (2007-08-15)
// 0 !HISTORY 2009-09-03 [PTadmin] Official Update 2009-02
// 0 !HISTORY 2012-06-03 [C3POwen] Complete rewrite; added rounded corners
// 0 !HISTORY 2012-08-09 [PTadmin] Official Update 2012-02
// 0 !HISTORY 2019-08-31 [cwdee] Further qualify description
// 0 !HISTORY 2019-09-09 [PTadmin] Official Update 2019-02
// 
// 
// 1 16 0 20 0 1 0 0 0 -1 0 0 0 1 stud3.dat
  [1,16,0,20,0,1,0,0,0,-1,0,0,0,1, ldraw_lib__stud3(realsolid)],
// 1 16 -20 20 0 1 0 0 0 -1 0 0 0 1 stud3.dat
  [1,16,-20,20,0,1,0,0,0,-1,0,0,0,1, ldraw_lib__stud3(realsolid)],
// 1 16 20 20 0 1 0 0 0 -1 0 0 0 1 stud3.dat
  [1,16,20,20,0,1,0,0,0,-1,0,0,0,1, ldraw_lib__stud3(realsolid)],
// 0 BFC INVERTNEXT
  [0,"BFC","INVERTNEXT"],
// 1 16 0 24 0 36 0 0 0 -4 0 0 0 6 box5.dat
  [1,16,0,24,0,36,0,0,0,-4,0,0,0,6, ldraw_lib__box5(realsolid)],
// 4 16 40 24 10 36 24 6 -36 24 6 -40 24 10
  [4,16,40,24,10,36,24,6,-36,24,6,-40,24,10],
// 4 16 -40 24 10 -36 24 6 -36 24 -6 -40 24 -10
  [4,16,-40,24,10,-36,24,6,-36,24,-6,-40,24,-10],
// 4 16 -40 24 -10 -36 24 -6 36 24 -6 40 24 -10
  [4,16,-40,24,-10,-36,24,-6,36,24,-6,40,24,-10],
// 4 16 40 24 -10 36 24 -6 36 24 6 40 24 10
  [4,16,40,24,-10,36,24,-6,36,24,6,40,24,10],
// 2 24 40 24 10 -40 24 10
  [2,24,40,24,10,-40,24,10],
// 2 24 -40 24 10 -40 24 -10
  [2,24,-40,24,10,-40,24,-10],
// 2 24 40 24 -10 40 24 10
  [2,24,40,24,-10,40,24,10],
// 2 24 40 2 6 40 16 6
  [2,24,40,2,6,40,16,6],
// 2 24 -40 2 6 -40 16 6
  [2,24,-40,2,6,-40,16,6],
// 2 24 40 2 10 40 24 10
  [2,24,40,2,10,40,24,10],
// 2 24 -40 2 10 -40 24 10
  [2,24,-40,2,10,-40,24,10],
// 2 24 38 0 10 -38 0 10
  [2,24,38,0,10,-38,0,10],
// 2 24 -38 0 6 38 0 6
  [2,24,-38,0,6,38,0,6],
// 4 16 -40 24 10 -40 24 -10 -40 16 -10 -40 16 6
  [4,16,-40,24,10,-40,24,-10,-40,16,-10,-40,16,6],
// 4 16 40 24 -10 40 24 10 40 16 6 40 16 -10
  [4,16,40,24,-10,40,24,10,40,16,6,40,16,-10],
// 4 16 -40 24 10 -40 16 6 -40 2 6 -40 2 10
  [4,16,-40,24,10,-40,16,6,-40,2,6,-40,2,10],
// 4 16 40 16 6 40 24 10 40 2 10 40 2 6
  [4,16,40,16,6,40,24,10,40,2,10,40,2,6],
// 4 16 40 24 10 -40 24 10 -38 2 10 38 2 10
  [4,16,40,24,10,-40,24,10,-38,2,10,38,2,10],
// 4 16 38 2 10 -38 2 10 -38 0 10 38 0 10
  [4,16,38,2,10,-38,2,10,-38,0,10,38,0,10],
// 3 16 40 24 10 38 2 10 40 2 10
  [3,16,40,24,10,38,2,10,40,2,10],
// 3 16 -40 24 10 -40 2 10 -38 2 10
  [3,16,-40,24,10,-40,2,10,-38,2,10],
// 4 16 -40 16 6 40 16 6 38 2 6 -38 2 6
  [4,16,-40,16,6,40,16,6,38,2,6,-38,2,6],
// 4 16 -38 2 6 38 2 6 38 0 6 -38 0 6
  [4,16,-38,2,6,38,2,6,38,0,6,-38,0,6],
// 3 16 40 16 6 40 2 6 38 2 6
  [3,16,40,16,6,40,2,6,38,2,6],
// 3 16 -40 16 6 -38 2 6 -40 2 6
  [3,16,-40,16,6,-38,2,6,-40,2,6],
// 4 16 38 0 6 38 0 10 -38 0 10 -38 0 6
  [4,16,38,0,6,38,0,10,-38,0,10,-38,0,6],
// 1 16 38 2 6 2 0 0 0 0 -2 0 2 0 1-4disc.dat
  [1,16,38,2,6,2,0,0,0,0,-2,0,2,0, ldraw_lib__1_4disc(realsolid)],
// 1 16 38 2 10 2 0 0 0 0 -2 0 -2 0 1-4disc.dat
  [1,16,38,2,10,2,0,0,0,0,-2,0,-2,0, ldraw_lib__1_4disc(realsolid)],
// 1 16 -38 2 10 -2 0 0 0 0 -2 0 -2 0 1-4disc.dat
  [1,16,-38,2,10,-2,0,0,0,0,-2,0,-2,0, ldraw_lib__1_4disc(realsolid)],
// 1 16 -38 2 6 -2 0 0 0 0 -2 0 2 0 1-4disc.dat
  [1,16,-38,2,6,-2,0,0,0,0,-2,0,2,0, ldraw_lib__1_4disc(realsolid)],
// 1 16 38 2 6 2 0 0 0 0 -2 0 4 0 1-4cylo.dat
  [1,16,38,2,6,2,0,0,0,0,-2,0,4,0, ldraw_lib__1_4cylo(realsolid)],
// 1 16 -38 2 10 -2 0 0 0 0 -2 0 -4 0 1-4cylo.dat
  [1,16,-38,2,10,-2,0,0,0,0,-2,0,-4,0, ldraw_lib__1_4cylo(realsolid)],
// 1 16 0 20 -2 -40 0 0 0 -4 0 0 0 -8 box2-5.dat
  [1,16,0,20,-2,-40,0,0,0,-4,0,0,0,-8, ldraw_lib__box2_5(realsolid)],
];
module ldraw_lib__30413(step=0, col=false, unit=2/5, alt=false, line=0.2, solid=!$preview)
    makepoly(ldraw_lib__30413(solid), step=step, col=col, unit=unit, alt=alt, line=line, solid=solid);
ldraw_lib__30413(line=0.2);
// main file
use <../lib.scad>
use <30413.scad>
use <6221655w.scad>
function ldraw_lib__30413d08() = [
// 0 Panel  1 x  4 x  1 with Red Stripe on Black Background Left Sticker
// 0 Name: 30413d08.dat
// 0 Author: Alfred Schmitz [AlfredS]
// 0 !LDRAW_ORG Shortcut UPDATE 2026-09
// 0 !LICENSE Licensed under CC BY 4.0 : see CAreadme.txt
// 
// 0 BFC CERTIFY CCW
  [0,"BFC","CERTIFY"],
  [0,"BFC","CCW"],
// 
// 0 !CATEGORY Sticker Shortcut
// 0 !KEYWORDS 911 RSR, Porsche, Set 75888, Speed Champions, Turbo
// 
// 0 !HISTORY 2026-09-30 [OrionP] Official Update 2026-09
// 
// 1 16 0 0 0 1 0 0 0 1 0 0 0 1 30413.dat
  [1,16,0,0,0,1,0,0,0,1,0,0,0,1, ldraw_lib__30413()],
// 1 16 0 16 -2 1 0 0 0 1 0 0 0 1 6221655w.dat
  [1,16,0,16,-2,1,0,0,0,1,0,0,0,1, ldraw_lib__6221655w()],
];
module ldraw_lib__30413d08(step=0, col=false, unit=2/5, alt=false, line=0.2, solid=!$preview)
    makepoly(ldraw_lib__30413d08(), step=step, col=col, unit=unit, alt=alt, line=line, solid=solid);
ldraw_lib__30413d08(line=0.2);
